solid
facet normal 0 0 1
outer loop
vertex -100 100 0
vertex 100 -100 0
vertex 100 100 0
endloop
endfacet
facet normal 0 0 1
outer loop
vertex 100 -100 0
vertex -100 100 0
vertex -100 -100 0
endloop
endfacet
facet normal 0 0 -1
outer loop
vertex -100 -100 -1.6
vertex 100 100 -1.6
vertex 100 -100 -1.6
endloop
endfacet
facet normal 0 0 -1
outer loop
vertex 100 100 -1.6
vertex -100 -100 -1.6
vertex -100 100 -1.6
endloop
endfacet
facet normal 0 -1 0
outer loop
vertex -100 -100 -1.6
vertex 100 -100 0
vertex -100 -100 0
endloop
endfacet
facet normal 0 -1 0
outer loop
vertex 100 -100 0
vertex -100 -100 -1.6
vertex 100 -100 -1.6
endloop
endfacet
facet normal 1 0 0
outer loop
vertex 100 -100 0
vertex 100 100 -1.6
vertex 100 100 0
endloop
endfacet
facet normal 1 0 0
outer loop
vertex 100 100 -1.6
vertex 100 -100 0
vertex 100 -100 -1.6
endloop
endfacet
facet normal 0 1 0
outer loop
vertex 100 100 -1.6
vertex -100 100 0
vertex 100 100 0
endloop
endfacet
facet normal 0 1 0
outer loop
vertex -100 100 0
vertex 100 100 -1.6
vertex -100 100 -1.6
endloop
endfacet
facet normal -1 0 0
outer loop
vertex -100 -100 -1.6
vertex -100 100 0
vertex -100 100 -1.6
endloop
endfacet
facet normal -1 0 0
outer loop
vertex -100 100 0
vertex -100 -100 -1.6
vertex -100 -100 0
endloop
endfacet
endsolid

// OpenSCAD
// file: ../config.scad
/*
 * config
 *
 * Copyright 2013 <b@Zi.iS>
 * License CC BY 3.0
 */

$fa = 1;
$fs = 1;
preview = 1;

// preview colors
color_steal = [.8,.8,.8];
color_wood = [.3,.3,0];
color_print = [0,.8,0];

// metric bolt sizes
function m_hole(size) = size*1.1/2;
function m_pilot(size) = size*.9/2;

mounting_bolt = 3;

// slightly move and slightly elongate objects in preview to overcome scad rounding errors
module e() {
	if(preview==1) {
		translate([
			0,
			0,
			-.1
		]) {
			scale([
				1,
				1,
				1.1
			]) {
				child();
			}
		}
	} else {
		child();
	}
}

module m_washer(
	size = 3
) {
	color(color_steal) {
		difference() {
			cylinder(
				r = size/2*2,
				h = size*.2
			);
			e() cylinder(
				r = size/2,
				h = size*.2
			);
		}
	}
	translate([
		0,
		0,
		size*.2
	]) {
		child();
	}
}

module m_nut(
	size = 3
) {
	color(color_steal) {
		difference() {
			cylinder(
				r = size*1.8/2,
				h = size*.8,
				$fn = 6
			);
		}
	}
	translate([
		0,
		0,
		size*.8
	]) {
		child();
	}
}

module m_nylock(
	size = 3
) {
	color(color_steal) {
		difference() {
			cylinder(
				r = size*1.8/2,
				h = size,
				$fn = 6
			);
		}
	}
	translate([
		0,
		0,
		size
	]) {
		child();
	}
}

module screw(
	r = 1,
	h = 1,
	pitch = 5,
) {
	linear_extrude(
		height = h,
		twist = -h/pitch*360
	) {
		translate([pitch/5,0,0]) { //H=.2*p works better in plastic then ISO's H=.866*p
			circle(
				r=r 
			);
		}
	}
}

fan40 = [
	40,			//width/length
	10,			//height
	32,			//bolt pitch
	3,			//bolt
];

lm8uu = [
	15.2/2,	//outside
	8/2,	//inside
	26,		//length
];
// main file
/*
 * heated bed
 *
 * Copyright 2013 <b@Zi.iS>
 * License CC BY 3.0
 */

include <../config.scad>

heated_bed();

module heated_bed(
	size = 200,
	h = 1.6
) {
	echo("Heated Bed ", size, "x", size, "x", h, "mm");
	color([.8,0,0]) {
		translate([
			-size/2,
			-size/2,
			-h
		]) {
			cube([
				size,
				size,
				h
			]);
		}
	}
}
